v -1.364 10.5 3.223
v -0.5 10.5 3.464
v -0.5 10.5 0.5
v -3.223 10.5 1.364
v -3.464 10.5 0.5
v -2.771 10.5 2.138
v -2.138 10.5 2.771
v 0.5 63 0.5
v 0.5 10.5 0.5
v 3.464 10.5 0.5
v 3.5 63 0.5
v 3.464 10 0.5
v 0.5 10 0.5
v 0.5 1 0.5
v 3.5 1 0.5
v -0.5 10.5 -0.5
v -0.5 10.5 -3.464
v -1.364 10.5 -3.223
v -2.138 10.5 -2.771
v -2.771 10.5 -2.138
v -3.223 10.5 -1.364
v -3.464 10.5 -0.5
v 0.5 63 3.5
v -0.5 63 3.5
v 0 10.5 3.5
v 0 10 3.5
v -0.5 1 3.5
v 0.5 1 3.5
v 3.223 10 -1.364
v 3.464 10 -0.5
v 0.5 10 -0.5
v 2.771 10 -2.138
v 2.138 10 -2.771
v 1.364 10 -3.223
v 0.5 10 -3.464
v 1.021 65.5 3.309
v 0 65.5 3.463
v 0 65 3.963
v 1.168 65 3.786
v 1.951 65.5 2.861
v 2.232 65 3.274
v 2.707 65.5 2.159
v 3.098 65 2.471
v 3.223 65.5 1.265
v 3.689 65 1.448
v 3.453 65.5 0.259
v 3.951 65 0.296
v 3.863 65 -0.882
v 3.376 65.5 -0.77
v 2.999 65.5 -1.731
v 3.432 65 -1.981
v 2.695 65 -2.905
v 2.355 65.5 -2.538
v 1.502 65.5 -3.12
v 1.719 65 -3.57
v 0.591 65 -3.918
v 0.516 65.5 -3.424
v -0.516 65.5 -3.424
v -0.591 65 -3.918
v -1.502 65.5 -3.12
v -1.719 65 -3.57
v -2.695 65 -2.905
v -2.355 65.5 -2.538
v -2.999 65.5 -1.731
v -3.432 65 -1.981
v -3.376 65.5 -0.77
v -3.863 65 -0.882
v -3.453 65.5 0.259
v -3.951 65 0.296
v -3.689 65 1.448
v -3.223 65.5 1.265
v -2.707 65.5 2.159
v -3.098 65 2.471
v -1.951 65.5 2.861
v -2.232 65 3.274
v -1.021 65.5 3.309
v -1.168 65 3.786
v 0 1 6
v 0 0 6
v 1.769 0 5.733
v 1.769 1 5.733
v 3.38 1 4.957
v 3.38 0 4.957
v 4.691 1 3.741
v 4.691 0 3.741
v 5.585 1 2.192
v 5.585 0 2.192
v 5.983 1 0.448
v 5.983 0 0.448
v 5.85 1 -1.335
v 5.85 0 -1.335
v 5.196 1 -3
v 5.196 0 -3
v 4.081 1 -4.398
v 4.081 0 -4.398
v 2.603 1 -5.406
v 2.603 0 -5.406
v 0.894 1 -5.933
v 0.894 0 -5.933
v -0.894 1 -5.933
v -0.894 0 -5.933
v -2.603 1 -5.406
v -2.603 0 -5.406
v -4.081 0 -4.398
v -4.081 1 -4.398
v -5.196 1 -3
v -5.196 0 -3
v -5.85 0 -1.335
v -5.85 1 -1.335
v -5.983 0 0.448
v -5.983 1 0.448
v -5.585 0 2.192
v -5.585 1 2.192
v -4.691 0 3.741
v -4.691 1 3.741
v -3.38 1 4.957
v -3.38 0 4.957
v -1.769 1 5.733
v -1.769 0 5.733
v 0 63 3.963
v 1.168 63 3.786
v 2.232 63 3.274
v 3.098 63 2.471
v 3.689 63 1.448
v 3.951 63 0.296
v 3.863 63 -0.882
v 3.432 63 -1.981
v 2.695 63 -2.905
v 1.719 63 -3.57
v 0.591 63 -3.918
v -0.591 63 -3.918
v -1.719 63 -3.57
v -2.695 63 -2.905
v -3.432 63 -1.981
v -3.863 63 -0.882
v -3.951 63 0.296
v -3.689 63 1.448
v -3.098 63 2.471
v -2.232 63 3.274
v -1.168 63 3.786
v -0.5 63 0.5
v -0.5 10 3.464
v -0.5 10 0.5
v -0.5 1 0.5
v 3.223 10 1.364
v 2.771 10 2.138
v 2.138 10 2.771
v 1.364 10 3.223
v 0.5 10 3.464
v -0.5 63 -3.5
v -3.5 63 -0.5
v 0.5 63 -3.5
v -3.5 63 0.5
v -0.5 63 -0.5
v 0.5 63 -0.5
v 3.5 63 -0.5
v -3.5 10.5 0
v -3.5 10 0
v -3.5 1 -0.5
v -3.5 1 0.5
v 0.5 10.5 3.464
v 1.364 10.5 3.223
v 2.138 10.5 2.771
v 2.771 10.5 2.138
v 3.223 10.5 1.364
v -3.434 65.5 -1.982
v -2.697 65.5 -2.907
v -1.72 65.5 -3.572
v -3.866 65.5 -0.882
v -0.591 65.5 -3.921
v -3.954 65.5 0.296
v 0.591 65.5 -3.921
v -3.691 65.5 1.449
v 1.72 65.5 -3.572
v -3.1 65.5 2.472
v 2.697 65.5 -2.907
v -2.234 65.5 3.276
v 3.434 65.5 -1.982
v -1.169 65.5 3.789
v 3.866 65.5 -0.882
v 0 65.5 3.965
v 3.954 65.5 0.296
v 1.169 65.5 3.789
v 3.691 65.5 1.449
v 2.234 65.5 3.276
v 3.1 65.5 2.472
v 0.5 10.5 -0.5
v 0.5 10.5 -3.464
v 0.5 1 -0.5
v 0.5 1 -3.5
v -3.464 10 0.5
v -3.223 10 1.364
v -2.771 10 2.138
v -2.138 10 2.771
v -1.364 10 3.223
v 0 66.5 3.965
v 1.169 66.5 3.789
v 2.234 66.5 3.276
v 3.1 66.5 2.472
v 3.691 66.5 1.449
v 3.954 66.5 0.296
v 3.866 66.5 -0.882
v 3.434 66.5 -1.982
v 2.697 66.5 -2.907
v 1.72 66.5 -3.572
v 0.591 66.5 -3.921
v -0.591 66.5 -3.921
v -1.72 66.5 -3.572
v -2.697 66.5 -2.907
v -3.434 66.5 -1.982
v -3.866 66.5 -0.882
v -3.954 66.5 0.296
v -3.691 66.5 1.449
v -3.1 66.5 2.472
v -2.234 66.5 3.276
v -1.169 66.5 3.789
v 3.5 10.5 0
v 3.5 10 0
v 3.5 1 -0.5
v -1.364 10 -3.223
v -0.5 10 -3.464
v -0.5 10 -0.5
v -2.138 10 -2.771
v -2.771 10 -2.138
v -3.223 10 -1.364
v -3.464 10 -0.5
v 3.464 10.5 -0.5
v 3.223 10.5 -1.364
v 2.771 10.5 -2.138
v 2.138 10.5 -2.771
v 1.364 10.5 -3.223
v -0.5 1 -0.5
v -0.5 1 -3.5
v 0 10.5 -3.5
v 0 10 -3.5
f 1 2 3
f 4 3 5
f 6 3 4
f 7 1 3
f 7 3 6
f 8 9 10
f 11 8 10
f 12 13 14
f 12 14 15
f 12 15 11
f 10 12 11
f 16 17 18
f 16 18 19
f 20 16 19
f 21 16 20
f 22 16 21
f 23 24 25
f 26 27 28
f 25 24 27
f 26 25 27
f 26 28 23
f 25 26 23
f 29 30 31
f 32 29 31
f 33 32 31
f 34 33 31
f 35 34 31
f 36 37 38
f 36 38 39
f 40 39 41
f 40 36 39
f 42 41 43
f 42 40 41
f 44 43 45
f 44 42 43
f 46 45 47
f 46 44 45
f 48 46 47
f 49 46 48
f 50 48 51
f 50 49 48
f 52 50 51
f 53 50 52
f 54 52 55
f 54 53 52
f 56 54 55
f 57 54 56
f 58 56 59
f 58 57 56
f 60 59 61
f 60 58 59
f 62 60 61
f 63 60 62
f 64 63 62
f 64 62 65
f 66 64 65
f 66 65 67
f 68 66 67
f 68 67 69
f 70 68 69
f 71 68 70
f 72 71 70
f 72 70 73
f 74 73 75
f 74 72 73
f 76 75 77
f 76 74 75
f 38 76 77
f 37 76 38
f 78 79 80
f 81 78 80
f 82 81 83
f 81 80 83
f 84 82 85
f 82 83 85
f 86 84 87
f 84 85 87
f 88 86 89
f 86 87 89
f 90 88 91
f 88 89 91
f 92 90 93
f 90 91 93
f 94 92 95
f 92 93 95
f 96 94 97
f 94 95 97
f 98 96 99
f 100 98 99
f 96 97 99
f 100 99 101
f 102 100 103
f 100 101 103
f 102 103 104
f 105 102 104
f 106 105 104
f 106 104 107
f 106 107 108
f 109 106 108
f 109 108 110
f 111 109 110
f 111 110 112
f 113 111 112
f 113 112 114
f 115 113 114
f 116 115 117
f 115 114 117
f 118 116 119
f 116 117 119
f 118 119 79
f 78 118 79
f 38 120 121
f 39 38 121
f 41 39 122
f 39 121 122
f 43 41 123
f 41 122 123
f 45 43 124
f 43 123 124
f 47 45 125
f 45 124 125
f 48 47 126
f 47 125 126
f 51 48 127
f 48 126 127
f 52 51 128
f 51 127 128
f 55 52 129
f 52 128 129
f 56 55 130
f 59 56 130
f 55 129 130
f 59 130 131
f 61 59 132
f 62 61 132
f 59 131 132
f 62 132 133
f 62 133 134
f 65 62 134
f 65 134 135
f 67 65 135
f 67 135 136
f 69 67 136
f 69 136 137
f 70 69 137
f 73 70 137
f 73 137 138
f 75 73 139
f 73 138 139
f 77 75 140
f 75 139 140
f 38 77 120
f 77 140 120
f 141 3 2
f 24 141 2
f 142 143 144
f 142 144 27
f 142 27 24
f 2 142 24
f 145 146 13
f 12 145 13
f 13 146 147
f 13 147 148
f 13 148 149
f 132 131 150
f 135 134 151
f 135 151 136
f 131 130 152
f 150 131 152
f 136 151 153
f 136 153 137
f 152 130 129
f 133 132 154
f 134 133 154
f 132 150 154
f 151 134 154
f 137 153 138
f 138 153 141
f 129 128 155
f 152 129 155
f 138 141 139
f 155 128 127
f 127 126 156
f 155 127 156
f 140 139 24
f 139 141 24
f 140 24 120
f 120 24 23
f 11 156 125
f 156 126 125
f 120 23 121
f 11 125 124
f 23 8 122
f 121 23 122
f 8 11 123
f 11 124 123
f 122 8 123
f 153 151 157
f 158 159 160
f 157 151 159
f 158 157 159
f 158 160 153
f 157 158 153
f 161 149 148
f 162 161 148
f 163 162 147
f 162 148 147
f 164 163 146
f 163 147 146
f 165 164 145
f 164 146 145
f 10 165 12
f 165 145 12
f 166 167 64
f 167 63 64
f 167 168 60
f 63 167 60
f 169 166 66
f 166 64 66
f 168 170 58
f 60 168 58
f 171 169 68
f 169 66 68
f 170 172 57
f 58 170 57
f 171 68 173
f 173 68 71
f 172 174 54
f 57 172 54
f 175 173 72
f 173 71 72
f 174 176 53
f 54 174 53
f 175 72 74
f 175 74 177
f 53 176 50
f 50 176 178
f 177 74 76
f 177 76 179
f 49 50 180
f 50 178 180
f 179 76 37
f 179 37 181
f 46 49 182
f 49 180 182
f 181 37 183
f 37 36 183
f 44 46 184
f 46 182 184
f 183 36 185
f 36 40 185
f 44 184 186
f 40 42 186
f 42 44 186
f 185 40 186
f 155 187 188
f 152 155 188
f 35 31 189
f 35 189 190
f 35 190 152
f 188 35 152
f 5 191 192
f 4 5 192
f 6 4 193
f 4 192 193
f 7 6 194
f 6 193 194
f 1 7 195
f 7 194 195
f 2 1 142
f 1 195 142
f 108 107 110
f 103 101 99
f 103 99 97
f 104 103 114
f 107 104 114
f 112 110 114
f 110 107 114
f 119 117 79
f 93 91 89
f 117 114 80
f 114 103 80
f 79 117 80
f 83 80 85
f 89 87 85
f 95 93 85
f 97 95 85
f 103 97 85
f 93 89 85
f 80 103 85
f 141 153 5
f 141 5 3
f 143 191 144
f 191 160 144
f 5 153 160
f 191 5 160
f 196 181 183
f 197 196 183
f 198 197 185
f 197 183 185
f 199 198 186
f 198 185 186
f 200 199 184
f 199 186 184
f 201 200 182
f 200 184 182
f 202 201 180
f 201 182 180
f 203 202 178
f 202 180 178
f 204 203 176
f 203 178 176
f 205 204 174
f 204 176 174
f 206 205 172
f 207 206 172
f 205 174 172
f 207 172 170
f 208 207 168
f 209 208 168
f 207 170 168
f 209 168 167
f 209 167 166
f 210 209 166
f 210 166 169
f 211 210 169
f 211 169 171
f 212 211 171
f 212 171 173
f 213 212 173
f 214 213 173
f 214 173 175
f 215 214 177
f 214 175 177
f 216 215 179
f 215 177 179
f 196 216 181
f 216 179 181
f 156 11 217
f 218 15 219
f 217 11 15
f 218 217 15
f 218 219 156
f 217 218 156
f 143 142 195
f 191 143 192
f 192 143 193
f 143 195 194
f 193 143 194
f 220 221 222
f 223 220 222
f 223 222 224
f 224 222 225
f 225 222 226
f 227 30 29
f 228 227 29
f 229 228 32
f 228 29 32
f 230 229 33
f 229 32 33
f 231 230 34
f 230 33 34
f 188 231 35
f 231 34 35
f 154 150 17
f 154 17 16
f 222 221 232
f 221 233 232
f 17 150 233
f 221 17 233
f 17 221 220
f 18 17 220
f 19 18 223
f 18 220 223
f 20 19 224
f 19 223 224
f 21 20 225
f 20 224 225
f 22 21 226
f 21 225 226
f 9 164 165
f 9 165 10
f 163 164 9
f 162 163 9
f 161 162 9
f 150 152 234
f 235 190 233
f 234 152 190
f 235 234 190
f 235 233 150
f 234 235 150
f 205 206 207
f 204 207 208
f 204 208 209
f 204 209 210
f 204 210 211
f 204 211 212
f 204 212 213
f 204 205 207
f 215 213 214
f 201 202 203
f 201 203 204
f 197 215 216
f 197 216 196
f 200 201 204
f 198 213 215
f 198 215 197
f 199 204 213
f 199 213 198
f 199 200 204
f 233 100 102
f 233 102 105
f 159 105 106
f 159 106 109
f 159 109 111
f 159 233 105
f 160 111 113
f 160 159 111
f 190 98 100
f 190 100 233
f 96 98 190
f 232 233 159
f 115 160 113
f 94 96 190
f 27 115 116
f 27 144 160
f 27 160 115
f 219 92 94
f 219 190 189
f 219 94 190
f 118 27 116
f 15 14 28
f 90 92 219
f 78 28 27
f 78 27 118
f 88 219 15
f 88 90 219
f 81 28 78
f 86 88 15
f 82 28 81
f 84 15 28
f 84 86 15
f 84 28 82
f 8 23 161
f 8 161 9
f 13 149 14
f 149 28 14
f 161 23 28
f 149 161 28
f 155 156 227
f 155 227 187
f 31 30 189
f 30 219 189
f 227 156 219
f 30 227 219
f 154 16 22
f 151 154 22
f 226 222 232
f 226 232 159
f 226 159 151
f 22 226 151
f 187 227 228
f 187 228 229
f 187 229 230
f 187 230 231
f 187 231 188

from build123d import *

# Parameters (mm, degrees)
SKETCH1_R      = 6
EXTRUDE1_DEPTH = 1
EXTRUDE2_DEPTH = 62
SKETCH5_R      = 3.5
EXTRUDE4_DEPTH = 0.5
SKETCH6_R      = 0.53375681
EXTRUDE5_DEPTH = 1.5
SKETCH7_R      = 3.962531225
EXTRUDE6_DEPTH = 2.5
CHAMFER1_SIZE  = 0.5
SKETCH8_R      = 3.96497508
EXTRUDE7_DEPTH = 1


with BuildPart() as part:
    # Sketch1 → Extrude1 (new body)
    with BuildSketch(Plane(origin=(0, 0, 0), x_dir=(1, 0, 0), z_dir=(0, 1, 0))):
        with Locations(Location((0, 0, 0), (0, 0, 270))):
            Circle(SKETCH1_R)
    extrude(amount=EXTRUDE1_DEPTH)

    # Sketch2 → Extrude2 (add)
    with BuildSketch(Plane(origin=(0, 1, 0), x_dir=(-1, 0, 0), z_dir=(0, 1, 0))):
        Polygon((0.5, 0.5), (0.5, 3.5), (-0.5, 3.5), (-0.5, 0.5), (-3.5, 0.5), (-3.5, -0.5), (-0.5, -0.5), (-0.5, -3.5), (0.5, -3.5), (0.5, -0.5), (3.5, -0.5), (3.5, 0.5), align=None)
    extrude(amount=EXTRUDE2_DEPTH)

    # Sketch5 → Extrude4 (add)
    with BuildSketch(Plane(origin=(0, 10, 0), x_dir=(-1, 0, 0), z_dir=(0, 1, 0))):
        Circle(SKETCH5_R)
    extrude(amount=EXTRUDE4_DEPTH)

    # Sketch6 → Extrude5 (add)
    with BuildSketch(Plane(origin=(0, 63, 0), x_dir=(-1, 0, 0), z_dir=(0, 1, 0))):
        with Locations(Location((0, 0, 0), (0, 0, 270))):
            Circle(SKETCH6_R)
    extrude(amount=EXTRUDE5_DEPTH)

    # Sketch7 → Extrude6 (add)
    with BuildSketch(Plane(origin=(0, 63, 0), x_dir=(-1, 0, 0), z_dir=(0, 1, 0))):
        with Locations(Location((0, 0, 0), (0, 0, 90))):
            Circle(SKETCH7_R)
    extrude(amount=EXTRUDE6_DEPTH)

    # Chamfer1
    chamfer1_edges = [part.edges().sort_by_distance(p)[0] for p in [
        (0, 65.5, -3.962531225),
    ]]
    chamfer(chamfer1_edges, length=CHAMFER1_SIZE)

    # Sketch8 → Extrude7 (add)
    with BuildSketch(Plane(origin=(0, 65.5, 0), x_dir=(-1, 0, 0), z_dir=(0, 1, 0))):
        with Locations(Location((0, 0, 0), (0, 0, 90))):
            Circle(SKETCH8_R)
    extrude(amount=EXTRUDE7_DEPTH)


solid = part.part
